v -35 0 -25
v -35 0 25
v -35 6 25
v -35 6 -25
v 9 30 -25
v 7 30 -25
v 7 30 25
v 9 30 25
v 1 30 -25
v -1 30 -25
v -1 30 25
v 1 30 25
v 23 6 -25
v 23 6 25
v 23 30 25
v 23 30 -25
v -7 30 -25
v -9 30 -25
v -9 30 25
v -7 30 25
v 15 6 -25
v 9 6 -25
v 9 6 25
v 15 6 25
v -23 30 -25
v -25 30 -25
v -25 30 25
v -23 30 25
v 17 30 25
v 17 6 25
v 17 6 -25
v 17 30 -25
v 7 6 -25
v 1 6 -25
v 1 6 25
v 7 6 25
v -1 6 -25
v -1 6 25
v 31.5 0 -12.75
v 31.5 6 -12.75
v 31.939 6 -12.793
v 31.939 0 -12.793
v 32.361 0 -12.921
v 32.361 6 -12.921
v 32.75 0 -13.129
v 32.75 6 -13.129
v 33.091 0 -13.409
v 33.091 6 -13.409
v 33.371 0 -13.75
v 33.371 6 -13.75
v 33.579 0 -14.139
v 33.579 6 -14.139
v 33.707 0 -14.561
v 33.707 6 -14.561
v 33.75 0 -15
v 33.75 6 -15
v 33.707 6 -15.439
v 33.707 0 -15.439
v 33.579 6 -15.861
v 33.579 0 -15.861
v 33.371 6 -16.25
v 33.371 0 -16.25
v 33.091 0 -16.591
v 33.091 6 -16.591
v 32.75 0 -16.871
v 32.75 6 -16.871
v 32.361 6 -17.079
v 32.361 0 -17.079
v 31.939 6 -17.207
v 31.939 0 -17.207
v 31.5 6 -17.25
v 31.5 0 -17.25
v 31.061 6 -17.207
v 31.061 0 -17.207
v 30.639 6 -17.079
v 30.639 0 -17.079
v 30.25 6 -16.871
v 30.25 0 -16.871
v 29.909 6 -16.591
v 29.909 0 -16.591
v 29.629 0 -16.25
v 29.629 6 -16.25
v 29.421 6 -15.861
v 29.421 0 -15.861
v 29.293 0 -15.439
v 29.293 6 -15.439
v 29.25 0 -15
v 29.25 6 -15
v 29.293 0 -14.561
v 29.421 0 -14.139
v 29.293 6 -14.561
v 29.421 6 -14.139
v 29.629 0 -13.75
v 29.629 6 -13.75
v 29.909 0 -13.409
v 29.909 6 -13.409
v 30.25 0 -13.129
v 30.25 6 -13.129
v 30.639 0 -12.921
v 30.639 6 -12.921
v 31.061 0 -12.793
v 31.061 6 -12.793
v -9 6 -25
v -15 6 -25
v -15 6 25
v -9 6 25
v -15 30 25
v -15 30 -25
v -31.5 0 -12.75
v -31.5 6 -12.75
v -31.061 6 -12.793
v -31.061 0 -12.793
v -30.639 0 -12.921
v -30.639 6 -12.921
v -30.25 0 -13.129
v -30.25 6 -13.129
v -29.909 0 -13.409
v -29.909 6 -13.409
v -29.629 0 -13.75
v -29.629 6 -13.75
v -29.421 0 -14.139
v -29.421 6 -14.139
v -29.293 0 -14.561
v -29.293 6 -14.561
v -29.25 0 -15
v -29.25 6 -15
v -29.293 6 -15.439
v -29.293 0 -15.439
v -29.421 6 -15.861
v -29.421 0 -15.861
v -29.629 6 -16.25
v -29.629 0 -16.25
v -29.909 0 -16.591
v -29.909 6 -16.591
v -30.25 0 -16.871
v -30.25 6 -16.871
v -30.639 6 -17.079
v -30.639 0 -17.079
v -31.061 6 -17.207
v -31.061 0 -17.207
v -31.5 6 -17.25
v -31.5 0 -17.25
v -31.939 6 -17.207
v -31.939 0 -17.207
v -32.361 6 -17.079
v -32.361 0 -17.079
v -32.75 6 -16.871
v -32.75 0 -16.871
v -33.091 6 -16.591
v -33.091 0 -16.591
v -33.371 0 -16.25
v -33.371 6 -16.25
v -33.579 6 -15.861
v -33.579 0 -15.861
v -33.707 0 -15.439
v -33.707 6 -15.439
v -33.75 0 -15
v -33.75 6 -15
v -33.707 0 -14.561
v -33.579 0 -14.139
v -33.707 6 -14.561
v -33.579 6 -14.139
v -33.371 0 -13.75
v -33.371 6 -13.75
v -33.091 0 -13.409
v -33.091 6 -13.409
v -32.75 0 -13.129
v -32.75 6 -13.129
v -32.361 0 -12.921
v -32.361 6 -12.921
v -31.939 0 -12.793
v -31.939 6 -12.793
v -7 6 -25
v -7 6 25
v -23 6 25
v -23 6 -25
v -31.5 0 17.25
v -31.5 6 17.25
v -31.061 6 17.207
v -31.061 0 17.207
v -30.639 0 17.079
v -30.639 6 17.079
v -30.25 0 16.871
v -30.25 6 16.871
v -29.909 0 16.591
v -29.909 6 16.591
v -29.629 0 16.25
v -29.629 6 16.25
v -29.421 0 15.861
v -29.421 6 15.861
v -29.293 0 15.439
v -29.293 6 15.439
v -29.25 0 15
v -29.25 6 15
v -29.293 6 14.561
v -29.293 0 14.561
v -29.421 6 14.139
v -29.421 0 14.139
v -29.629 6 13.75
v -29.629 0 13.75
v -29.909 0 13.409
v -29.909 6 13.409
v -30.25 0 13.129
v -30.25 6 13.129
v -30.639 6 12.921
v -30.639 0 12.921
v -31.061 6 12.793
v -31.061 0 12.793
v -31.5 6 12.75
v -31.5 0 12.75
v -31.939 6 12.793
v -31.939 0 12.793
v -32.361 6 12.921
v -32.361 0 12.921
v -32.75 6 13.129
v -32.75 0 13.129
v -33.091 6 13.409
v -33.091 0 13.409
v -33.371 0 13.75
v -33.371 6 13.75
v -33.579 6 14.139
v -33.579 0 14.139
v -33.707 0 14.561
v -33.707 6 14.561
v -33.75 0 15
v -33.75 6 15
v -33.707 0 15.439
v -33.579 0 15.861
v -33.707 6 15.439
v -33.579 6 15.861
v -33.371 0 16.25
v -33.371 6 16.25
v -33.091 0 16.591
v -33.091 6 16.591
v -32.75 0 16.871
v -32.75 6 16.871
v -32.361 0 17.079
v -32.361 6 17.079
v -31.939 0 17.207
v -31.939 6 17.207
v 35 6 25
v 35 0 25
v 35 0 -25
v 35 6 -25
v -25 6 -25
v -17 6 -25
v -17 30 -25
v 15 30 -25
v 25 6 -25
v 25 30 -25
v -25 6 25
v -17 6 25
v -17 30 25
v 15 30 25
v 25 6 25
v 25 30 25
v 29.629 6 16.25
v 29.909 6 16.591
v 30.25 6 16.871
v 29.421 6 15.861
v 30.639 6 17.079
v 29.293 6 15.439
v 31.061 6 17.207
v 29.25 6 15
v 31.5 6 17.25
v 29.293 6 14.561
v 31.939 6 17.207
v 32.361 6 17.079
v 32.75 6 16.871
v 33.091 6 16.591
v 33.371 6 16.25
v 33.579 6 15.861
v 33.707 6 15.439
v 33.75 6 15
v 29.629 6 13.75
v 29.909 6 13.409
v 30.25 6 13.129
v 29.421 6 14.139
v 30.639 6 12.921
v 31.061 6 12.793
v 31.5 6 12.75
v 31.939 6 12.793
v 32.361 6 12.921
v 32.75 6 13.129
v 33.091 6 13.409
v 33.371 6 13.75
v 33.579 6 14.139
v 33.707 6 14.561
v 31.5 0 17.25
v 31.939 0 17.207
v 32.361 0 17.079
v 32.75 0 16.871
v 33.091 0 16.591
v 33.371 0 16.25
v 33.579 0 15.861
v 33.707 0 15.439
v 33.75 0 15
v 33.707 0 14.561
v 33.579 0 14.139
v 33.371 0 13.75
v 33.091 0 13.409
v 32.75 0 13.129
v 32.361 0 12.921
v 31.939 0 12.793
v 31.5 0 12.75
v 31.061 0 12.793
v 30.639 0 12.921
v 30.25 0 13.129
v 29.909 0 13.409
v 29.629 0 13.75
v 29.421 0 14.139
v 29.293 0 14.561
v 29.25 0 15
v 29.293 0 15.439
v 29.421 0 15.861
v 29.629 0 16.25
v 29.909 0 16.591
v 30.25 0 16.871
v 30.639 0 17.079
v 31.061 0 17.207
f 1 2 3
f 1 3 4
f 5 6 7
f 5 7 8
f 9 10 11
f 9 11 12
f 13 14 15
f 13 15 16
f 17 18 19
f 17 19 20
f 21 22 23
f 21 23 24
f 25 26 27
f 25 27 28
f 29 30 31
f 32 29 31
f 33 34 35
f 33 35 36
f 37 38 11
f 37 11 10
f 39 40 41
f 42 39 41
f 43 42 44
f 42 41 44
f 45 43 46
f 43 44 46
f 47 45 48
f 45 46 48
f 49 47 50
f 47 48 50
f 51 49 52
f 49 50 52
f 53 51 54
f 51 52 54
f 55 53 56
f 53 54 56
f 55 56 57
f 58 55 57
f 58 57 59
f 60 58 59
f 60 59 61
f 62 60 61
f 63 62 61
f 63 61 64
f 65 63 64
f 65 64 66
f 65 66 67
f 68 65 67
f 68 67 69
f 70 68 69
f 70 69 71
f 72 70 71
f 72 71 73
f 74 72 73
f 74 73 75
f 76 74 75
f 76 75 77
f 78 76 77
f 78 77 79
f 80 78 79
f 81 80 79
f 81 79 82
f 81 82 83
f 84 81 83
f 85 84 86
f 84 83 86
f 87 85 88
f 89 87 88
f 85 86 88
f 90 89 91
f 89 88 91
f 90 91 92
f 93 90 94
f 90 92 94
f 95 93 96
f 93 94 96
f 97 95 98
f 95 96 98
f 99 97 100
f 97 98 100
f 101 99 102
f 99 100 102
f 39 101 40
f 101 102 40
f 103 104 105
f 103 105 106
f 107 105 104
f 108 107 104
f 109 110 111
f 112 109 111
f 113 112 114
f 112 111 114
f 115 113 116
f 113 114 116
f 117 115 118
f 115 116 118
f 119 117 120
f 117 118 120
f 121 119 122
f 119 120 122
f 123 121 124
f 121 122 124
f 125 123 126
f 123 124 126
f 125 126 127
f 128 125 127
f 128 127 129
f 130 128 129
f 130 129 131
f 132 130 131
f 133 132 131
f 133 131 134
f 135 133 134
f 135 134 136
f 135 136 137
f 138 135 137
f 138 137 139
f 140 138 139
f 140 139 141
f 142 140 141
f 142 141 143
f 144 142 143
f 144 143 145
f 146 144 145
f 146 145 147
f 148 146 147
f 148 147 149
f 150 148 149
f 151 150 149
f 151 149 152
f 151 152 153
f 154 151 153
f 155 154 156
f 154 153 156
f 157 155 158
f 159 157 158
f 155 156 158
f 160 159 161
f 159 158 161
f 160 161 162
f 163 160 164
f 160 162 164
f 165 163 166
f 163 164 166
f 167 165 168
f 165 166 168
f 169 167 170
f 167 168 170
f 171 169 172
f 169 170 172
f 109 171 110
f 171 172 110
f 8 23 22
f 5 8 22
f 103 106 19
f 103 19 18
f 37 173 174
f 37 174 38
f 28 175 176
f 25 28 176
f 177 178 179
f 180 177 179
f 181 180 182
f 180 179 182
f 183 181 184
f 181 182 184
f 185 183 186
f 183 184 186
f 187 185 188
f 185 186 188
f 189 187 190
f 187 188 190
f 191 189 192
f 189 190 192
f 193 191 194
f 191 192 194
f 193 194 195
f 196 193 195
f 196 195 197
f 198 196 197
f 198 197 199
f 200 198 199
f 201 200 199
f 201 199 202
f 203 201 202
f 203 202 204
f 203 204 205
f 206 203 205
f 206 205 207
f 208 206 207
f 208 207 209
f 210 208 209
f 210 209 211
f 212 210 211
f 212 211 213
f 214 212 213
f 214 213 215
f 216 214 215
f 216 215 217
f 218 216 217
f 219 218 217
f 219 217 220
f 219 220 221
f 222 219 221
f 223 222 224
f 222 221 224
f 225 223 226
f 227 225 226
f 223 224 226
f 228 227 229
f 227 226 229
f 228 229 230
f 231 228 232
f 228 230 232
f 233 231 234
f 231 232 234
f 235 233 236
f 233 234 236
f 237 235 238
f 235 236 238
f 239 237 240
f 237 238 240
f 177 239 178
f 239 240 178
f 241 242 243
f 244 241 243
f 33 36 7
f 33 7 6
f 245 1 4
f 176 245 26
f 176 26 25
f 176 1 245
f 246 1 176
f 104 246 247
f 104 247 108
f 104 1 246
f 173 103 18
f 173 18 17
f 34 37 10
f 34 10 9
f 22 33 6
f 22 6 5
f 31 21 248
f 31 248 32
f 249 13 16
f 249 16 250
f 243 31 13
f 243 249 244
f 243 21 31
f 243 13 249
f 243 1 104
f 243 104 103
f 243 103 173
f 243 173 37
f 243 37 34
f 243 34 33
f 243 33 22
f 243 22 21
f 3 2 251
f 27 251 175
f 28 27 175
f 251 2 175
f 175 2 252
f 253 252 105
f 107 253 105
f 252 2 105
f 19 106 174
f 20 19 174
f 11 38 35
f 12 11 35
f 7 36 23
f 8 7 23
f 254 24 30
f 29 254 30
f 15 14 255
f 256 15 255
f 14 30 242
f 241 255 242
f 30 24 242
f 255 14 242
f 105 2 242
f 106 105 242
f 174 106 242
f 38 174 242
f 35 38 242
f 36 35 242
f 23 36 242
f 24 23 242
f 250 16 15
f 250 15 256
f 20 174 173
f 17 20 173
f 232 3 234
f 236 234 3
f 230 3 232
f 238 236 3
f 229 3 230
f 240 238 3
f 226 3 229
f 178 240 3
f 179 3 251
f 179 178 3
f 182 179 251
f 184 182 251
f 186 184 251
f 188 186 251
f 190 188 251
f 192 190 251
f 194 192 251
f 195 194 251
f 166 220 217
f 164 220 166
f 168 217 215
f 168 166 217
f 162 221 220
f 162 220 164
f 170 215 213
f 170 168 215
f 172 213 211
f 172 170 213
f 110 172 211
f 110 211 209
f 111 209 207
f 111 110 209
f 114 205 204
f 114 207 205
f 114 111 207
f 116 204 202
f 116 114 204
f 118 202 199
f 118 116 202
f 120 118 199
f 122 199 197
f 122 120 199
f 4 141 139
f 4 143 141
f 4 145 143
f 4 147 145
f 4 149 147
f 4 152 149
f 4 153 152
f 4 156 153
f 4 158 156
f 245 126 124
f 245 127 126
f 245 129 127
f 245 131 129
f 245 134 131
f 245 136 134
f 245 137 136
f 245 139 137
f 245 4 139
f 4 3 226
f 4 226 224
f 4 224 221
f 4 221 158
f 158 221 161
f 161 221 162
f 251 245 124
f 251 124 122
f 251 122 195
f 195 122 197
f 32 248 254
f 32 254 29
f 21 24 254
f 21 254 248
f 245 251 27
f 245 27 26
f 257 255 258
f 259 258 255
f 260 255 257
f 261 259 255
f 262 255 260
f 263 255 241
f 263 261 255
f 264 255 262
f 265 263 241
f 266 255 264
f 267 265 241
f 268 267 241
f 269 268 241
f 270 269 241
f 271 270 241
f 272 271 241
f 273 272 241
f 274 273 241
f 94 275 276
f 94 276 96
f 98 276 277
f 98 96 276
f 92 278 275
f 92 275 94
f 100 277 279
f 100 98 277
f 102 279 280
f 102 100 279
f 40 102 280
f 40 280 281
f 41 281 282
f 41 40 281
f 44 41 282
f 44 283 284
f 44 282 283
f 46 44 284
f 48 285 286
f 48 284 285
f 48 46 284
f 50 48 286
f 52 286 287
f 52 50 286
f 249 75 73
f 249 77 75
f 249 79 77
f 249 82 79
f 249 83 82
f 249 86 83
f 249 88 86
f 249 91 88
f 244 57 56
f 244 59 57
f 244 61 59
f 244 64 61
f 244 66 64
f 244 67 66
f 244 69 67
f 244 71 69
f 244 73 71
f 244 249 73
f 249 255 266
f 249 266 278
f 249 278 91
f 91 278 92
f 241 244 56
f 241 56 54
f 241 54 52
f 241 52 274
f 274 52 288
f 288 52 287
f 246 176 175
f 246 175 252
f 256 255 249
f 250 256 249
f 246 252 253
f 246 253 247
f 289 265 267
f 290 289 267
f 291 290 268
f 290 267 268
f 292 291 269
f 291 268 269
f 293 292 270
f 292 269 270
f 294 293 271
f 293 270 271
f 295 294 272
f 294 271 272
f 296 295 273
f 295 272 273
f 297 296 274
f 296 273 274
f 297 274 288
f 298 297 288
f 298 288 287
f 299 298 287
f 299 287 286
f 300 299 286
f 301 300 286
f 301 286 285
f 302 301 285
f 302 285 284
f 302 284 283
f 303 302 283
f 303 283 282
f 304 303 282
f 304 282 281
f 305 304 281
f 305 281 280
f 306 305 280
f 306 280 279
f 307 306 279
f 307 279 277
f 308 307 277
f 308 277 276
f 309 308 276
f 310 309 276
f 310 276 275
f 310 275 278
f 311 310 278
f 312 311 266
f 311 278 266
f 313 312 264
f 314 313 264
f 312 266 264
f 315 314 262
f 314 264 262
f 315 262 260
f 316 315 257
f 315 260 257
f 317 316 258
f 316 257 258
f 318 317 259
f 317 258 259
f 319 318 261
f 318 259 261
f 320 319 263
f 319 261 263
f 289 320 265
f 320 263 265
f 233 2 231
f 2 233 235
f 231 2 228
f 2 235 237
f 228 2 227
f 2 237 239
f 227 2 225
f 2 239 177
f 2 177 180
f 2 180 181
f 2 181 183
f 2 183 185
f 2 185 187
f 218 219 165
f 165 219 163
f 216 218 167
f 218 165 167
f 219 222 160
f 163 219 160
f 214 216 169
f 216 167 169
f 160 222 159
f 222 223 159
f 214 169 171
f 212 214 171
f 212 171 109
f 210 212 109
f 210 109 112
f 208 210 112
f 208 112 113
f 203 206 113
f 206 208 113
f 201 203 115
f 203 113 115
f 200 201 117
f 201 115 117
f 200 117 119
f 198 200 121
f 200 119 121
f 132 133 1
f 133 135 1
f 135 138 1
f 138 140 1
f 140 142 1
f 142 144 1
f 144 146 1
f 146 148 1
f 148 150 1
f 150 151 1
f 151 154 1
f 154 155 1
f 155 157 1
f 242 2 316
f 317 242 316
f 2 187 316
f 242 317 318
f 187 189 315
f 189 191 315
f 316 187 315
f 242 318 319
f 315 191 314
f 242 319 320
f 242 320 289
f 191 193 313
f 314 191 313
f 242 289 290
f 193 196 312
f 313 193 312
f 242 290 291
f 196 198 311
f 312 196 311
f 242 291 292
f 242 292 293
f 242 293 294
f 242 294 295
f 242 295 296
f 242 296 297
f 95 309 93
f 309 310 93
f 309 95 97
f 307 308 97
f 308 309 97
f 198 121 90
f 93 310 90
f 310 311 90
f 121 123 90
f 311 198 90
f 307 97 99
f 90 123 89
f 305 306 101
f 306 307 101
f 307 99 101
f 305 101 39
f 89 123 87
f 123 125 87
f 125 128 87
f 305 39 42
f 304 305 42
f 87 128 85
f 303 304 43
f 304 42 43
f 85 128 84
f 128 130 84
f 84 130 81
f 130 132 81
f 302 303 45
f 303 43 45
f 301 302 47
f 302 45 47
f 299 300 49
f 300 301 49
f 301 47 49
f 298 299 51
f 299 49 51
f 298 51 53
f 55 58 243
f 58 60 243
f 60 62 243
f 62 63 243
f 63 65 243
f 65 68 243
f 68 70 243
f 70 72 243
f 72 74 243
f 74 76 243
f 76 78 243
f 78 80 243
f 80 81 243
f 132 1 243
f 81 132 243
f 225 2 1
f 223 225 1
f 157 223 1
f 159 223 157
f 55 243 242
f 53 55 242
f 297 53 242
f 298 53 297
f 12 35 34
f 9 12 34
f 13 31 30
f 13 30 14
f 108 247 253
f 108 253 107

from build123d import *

# Parameters (mm, degrees)
SKETCH_1_W          = 70
SKETCH_1_H          = 50
EXTRUDE_1_DEPTH     = 6
SKETCH_2_W          = 2
SKETCH_2_H          = 50
EXTRUDE_2_DEPTH     = 24.5
SKETCH_3_R          = 2.25
CUT_EXTRUDE_1_DEPTH = 53.440442409


with BuildPart() as part:
    # 草图1 → 凸台-拉伸1 (new body)
    with BuildSketch(Plane(origin=(0, 0, 0), x_dir=(1, 0, 0), z_dir=(0, 1, 0))):
        Rectangle(SKETCH_1_W, SKETCH_1_H)
    extrude(amount=EXTRUDE_1_DEPTH)

    # 草图2 → 凸台-拉伸2 (add)
    with BuildSketch(Plane(origin=(0, 5.5, 0), x_dir=(1, 0, 0), z_dir=(0, 1, 0))):
        with Locations((-24, 0)):
            Rectangle(SKETCH_2_W, SKETCH_2_H)
        with Locations((-16, 0)):
            Rectangle(SKETCH_2_W, SKETCH_2_H)
        with Locations((-8, 0)):
            Rectangle(SKETCH_2_W, SKETCH_2_H)
        Rectangle(SKETCH_2_W, SKETCH_2_H)
        with Locations((8, 0)):
            Rectangle(SKETCH_2_W, SKETCH_2_H)
        with Locations((16, 0)):
            Rectangle(SKETCH_2_W, SKETCH_2_H)
        with Locations((24, 0)):
            Rectangle(SKETCH_2_W, SKETCH_2_H)
    extrude(amount=EXTRUDE_2_DEPTH)

    # 草图3 → 切除-拉伸1 (cut, through all)
    with BuildSketch(Plane(origin=(0, 30, 0), x_dir=(1, 0, 0), z_dir=(0, 1, 0))):
        with Locations(Location((-31.5, 15, 0), (0, 0, 270))):
            Circle(SKETCH_3_R)
        with Locations(Location((-31.5, -15, 0), (0, 0, 270))):
            Circle(SKETCH_3_R)
        with Locations(Location((31.5, 15, 0), (0, 0, 270))):
            Circle(SKETCH_3_R)
        with Locations(Location((31.5, -15, 0), (0, 0, 270))):
            Circle(SKETCH_3_R)
    extrude(amount=-CUT_EXTRUDE_1_DEPTH, mode=Mode.SUBTRACT)


solid = part.part
